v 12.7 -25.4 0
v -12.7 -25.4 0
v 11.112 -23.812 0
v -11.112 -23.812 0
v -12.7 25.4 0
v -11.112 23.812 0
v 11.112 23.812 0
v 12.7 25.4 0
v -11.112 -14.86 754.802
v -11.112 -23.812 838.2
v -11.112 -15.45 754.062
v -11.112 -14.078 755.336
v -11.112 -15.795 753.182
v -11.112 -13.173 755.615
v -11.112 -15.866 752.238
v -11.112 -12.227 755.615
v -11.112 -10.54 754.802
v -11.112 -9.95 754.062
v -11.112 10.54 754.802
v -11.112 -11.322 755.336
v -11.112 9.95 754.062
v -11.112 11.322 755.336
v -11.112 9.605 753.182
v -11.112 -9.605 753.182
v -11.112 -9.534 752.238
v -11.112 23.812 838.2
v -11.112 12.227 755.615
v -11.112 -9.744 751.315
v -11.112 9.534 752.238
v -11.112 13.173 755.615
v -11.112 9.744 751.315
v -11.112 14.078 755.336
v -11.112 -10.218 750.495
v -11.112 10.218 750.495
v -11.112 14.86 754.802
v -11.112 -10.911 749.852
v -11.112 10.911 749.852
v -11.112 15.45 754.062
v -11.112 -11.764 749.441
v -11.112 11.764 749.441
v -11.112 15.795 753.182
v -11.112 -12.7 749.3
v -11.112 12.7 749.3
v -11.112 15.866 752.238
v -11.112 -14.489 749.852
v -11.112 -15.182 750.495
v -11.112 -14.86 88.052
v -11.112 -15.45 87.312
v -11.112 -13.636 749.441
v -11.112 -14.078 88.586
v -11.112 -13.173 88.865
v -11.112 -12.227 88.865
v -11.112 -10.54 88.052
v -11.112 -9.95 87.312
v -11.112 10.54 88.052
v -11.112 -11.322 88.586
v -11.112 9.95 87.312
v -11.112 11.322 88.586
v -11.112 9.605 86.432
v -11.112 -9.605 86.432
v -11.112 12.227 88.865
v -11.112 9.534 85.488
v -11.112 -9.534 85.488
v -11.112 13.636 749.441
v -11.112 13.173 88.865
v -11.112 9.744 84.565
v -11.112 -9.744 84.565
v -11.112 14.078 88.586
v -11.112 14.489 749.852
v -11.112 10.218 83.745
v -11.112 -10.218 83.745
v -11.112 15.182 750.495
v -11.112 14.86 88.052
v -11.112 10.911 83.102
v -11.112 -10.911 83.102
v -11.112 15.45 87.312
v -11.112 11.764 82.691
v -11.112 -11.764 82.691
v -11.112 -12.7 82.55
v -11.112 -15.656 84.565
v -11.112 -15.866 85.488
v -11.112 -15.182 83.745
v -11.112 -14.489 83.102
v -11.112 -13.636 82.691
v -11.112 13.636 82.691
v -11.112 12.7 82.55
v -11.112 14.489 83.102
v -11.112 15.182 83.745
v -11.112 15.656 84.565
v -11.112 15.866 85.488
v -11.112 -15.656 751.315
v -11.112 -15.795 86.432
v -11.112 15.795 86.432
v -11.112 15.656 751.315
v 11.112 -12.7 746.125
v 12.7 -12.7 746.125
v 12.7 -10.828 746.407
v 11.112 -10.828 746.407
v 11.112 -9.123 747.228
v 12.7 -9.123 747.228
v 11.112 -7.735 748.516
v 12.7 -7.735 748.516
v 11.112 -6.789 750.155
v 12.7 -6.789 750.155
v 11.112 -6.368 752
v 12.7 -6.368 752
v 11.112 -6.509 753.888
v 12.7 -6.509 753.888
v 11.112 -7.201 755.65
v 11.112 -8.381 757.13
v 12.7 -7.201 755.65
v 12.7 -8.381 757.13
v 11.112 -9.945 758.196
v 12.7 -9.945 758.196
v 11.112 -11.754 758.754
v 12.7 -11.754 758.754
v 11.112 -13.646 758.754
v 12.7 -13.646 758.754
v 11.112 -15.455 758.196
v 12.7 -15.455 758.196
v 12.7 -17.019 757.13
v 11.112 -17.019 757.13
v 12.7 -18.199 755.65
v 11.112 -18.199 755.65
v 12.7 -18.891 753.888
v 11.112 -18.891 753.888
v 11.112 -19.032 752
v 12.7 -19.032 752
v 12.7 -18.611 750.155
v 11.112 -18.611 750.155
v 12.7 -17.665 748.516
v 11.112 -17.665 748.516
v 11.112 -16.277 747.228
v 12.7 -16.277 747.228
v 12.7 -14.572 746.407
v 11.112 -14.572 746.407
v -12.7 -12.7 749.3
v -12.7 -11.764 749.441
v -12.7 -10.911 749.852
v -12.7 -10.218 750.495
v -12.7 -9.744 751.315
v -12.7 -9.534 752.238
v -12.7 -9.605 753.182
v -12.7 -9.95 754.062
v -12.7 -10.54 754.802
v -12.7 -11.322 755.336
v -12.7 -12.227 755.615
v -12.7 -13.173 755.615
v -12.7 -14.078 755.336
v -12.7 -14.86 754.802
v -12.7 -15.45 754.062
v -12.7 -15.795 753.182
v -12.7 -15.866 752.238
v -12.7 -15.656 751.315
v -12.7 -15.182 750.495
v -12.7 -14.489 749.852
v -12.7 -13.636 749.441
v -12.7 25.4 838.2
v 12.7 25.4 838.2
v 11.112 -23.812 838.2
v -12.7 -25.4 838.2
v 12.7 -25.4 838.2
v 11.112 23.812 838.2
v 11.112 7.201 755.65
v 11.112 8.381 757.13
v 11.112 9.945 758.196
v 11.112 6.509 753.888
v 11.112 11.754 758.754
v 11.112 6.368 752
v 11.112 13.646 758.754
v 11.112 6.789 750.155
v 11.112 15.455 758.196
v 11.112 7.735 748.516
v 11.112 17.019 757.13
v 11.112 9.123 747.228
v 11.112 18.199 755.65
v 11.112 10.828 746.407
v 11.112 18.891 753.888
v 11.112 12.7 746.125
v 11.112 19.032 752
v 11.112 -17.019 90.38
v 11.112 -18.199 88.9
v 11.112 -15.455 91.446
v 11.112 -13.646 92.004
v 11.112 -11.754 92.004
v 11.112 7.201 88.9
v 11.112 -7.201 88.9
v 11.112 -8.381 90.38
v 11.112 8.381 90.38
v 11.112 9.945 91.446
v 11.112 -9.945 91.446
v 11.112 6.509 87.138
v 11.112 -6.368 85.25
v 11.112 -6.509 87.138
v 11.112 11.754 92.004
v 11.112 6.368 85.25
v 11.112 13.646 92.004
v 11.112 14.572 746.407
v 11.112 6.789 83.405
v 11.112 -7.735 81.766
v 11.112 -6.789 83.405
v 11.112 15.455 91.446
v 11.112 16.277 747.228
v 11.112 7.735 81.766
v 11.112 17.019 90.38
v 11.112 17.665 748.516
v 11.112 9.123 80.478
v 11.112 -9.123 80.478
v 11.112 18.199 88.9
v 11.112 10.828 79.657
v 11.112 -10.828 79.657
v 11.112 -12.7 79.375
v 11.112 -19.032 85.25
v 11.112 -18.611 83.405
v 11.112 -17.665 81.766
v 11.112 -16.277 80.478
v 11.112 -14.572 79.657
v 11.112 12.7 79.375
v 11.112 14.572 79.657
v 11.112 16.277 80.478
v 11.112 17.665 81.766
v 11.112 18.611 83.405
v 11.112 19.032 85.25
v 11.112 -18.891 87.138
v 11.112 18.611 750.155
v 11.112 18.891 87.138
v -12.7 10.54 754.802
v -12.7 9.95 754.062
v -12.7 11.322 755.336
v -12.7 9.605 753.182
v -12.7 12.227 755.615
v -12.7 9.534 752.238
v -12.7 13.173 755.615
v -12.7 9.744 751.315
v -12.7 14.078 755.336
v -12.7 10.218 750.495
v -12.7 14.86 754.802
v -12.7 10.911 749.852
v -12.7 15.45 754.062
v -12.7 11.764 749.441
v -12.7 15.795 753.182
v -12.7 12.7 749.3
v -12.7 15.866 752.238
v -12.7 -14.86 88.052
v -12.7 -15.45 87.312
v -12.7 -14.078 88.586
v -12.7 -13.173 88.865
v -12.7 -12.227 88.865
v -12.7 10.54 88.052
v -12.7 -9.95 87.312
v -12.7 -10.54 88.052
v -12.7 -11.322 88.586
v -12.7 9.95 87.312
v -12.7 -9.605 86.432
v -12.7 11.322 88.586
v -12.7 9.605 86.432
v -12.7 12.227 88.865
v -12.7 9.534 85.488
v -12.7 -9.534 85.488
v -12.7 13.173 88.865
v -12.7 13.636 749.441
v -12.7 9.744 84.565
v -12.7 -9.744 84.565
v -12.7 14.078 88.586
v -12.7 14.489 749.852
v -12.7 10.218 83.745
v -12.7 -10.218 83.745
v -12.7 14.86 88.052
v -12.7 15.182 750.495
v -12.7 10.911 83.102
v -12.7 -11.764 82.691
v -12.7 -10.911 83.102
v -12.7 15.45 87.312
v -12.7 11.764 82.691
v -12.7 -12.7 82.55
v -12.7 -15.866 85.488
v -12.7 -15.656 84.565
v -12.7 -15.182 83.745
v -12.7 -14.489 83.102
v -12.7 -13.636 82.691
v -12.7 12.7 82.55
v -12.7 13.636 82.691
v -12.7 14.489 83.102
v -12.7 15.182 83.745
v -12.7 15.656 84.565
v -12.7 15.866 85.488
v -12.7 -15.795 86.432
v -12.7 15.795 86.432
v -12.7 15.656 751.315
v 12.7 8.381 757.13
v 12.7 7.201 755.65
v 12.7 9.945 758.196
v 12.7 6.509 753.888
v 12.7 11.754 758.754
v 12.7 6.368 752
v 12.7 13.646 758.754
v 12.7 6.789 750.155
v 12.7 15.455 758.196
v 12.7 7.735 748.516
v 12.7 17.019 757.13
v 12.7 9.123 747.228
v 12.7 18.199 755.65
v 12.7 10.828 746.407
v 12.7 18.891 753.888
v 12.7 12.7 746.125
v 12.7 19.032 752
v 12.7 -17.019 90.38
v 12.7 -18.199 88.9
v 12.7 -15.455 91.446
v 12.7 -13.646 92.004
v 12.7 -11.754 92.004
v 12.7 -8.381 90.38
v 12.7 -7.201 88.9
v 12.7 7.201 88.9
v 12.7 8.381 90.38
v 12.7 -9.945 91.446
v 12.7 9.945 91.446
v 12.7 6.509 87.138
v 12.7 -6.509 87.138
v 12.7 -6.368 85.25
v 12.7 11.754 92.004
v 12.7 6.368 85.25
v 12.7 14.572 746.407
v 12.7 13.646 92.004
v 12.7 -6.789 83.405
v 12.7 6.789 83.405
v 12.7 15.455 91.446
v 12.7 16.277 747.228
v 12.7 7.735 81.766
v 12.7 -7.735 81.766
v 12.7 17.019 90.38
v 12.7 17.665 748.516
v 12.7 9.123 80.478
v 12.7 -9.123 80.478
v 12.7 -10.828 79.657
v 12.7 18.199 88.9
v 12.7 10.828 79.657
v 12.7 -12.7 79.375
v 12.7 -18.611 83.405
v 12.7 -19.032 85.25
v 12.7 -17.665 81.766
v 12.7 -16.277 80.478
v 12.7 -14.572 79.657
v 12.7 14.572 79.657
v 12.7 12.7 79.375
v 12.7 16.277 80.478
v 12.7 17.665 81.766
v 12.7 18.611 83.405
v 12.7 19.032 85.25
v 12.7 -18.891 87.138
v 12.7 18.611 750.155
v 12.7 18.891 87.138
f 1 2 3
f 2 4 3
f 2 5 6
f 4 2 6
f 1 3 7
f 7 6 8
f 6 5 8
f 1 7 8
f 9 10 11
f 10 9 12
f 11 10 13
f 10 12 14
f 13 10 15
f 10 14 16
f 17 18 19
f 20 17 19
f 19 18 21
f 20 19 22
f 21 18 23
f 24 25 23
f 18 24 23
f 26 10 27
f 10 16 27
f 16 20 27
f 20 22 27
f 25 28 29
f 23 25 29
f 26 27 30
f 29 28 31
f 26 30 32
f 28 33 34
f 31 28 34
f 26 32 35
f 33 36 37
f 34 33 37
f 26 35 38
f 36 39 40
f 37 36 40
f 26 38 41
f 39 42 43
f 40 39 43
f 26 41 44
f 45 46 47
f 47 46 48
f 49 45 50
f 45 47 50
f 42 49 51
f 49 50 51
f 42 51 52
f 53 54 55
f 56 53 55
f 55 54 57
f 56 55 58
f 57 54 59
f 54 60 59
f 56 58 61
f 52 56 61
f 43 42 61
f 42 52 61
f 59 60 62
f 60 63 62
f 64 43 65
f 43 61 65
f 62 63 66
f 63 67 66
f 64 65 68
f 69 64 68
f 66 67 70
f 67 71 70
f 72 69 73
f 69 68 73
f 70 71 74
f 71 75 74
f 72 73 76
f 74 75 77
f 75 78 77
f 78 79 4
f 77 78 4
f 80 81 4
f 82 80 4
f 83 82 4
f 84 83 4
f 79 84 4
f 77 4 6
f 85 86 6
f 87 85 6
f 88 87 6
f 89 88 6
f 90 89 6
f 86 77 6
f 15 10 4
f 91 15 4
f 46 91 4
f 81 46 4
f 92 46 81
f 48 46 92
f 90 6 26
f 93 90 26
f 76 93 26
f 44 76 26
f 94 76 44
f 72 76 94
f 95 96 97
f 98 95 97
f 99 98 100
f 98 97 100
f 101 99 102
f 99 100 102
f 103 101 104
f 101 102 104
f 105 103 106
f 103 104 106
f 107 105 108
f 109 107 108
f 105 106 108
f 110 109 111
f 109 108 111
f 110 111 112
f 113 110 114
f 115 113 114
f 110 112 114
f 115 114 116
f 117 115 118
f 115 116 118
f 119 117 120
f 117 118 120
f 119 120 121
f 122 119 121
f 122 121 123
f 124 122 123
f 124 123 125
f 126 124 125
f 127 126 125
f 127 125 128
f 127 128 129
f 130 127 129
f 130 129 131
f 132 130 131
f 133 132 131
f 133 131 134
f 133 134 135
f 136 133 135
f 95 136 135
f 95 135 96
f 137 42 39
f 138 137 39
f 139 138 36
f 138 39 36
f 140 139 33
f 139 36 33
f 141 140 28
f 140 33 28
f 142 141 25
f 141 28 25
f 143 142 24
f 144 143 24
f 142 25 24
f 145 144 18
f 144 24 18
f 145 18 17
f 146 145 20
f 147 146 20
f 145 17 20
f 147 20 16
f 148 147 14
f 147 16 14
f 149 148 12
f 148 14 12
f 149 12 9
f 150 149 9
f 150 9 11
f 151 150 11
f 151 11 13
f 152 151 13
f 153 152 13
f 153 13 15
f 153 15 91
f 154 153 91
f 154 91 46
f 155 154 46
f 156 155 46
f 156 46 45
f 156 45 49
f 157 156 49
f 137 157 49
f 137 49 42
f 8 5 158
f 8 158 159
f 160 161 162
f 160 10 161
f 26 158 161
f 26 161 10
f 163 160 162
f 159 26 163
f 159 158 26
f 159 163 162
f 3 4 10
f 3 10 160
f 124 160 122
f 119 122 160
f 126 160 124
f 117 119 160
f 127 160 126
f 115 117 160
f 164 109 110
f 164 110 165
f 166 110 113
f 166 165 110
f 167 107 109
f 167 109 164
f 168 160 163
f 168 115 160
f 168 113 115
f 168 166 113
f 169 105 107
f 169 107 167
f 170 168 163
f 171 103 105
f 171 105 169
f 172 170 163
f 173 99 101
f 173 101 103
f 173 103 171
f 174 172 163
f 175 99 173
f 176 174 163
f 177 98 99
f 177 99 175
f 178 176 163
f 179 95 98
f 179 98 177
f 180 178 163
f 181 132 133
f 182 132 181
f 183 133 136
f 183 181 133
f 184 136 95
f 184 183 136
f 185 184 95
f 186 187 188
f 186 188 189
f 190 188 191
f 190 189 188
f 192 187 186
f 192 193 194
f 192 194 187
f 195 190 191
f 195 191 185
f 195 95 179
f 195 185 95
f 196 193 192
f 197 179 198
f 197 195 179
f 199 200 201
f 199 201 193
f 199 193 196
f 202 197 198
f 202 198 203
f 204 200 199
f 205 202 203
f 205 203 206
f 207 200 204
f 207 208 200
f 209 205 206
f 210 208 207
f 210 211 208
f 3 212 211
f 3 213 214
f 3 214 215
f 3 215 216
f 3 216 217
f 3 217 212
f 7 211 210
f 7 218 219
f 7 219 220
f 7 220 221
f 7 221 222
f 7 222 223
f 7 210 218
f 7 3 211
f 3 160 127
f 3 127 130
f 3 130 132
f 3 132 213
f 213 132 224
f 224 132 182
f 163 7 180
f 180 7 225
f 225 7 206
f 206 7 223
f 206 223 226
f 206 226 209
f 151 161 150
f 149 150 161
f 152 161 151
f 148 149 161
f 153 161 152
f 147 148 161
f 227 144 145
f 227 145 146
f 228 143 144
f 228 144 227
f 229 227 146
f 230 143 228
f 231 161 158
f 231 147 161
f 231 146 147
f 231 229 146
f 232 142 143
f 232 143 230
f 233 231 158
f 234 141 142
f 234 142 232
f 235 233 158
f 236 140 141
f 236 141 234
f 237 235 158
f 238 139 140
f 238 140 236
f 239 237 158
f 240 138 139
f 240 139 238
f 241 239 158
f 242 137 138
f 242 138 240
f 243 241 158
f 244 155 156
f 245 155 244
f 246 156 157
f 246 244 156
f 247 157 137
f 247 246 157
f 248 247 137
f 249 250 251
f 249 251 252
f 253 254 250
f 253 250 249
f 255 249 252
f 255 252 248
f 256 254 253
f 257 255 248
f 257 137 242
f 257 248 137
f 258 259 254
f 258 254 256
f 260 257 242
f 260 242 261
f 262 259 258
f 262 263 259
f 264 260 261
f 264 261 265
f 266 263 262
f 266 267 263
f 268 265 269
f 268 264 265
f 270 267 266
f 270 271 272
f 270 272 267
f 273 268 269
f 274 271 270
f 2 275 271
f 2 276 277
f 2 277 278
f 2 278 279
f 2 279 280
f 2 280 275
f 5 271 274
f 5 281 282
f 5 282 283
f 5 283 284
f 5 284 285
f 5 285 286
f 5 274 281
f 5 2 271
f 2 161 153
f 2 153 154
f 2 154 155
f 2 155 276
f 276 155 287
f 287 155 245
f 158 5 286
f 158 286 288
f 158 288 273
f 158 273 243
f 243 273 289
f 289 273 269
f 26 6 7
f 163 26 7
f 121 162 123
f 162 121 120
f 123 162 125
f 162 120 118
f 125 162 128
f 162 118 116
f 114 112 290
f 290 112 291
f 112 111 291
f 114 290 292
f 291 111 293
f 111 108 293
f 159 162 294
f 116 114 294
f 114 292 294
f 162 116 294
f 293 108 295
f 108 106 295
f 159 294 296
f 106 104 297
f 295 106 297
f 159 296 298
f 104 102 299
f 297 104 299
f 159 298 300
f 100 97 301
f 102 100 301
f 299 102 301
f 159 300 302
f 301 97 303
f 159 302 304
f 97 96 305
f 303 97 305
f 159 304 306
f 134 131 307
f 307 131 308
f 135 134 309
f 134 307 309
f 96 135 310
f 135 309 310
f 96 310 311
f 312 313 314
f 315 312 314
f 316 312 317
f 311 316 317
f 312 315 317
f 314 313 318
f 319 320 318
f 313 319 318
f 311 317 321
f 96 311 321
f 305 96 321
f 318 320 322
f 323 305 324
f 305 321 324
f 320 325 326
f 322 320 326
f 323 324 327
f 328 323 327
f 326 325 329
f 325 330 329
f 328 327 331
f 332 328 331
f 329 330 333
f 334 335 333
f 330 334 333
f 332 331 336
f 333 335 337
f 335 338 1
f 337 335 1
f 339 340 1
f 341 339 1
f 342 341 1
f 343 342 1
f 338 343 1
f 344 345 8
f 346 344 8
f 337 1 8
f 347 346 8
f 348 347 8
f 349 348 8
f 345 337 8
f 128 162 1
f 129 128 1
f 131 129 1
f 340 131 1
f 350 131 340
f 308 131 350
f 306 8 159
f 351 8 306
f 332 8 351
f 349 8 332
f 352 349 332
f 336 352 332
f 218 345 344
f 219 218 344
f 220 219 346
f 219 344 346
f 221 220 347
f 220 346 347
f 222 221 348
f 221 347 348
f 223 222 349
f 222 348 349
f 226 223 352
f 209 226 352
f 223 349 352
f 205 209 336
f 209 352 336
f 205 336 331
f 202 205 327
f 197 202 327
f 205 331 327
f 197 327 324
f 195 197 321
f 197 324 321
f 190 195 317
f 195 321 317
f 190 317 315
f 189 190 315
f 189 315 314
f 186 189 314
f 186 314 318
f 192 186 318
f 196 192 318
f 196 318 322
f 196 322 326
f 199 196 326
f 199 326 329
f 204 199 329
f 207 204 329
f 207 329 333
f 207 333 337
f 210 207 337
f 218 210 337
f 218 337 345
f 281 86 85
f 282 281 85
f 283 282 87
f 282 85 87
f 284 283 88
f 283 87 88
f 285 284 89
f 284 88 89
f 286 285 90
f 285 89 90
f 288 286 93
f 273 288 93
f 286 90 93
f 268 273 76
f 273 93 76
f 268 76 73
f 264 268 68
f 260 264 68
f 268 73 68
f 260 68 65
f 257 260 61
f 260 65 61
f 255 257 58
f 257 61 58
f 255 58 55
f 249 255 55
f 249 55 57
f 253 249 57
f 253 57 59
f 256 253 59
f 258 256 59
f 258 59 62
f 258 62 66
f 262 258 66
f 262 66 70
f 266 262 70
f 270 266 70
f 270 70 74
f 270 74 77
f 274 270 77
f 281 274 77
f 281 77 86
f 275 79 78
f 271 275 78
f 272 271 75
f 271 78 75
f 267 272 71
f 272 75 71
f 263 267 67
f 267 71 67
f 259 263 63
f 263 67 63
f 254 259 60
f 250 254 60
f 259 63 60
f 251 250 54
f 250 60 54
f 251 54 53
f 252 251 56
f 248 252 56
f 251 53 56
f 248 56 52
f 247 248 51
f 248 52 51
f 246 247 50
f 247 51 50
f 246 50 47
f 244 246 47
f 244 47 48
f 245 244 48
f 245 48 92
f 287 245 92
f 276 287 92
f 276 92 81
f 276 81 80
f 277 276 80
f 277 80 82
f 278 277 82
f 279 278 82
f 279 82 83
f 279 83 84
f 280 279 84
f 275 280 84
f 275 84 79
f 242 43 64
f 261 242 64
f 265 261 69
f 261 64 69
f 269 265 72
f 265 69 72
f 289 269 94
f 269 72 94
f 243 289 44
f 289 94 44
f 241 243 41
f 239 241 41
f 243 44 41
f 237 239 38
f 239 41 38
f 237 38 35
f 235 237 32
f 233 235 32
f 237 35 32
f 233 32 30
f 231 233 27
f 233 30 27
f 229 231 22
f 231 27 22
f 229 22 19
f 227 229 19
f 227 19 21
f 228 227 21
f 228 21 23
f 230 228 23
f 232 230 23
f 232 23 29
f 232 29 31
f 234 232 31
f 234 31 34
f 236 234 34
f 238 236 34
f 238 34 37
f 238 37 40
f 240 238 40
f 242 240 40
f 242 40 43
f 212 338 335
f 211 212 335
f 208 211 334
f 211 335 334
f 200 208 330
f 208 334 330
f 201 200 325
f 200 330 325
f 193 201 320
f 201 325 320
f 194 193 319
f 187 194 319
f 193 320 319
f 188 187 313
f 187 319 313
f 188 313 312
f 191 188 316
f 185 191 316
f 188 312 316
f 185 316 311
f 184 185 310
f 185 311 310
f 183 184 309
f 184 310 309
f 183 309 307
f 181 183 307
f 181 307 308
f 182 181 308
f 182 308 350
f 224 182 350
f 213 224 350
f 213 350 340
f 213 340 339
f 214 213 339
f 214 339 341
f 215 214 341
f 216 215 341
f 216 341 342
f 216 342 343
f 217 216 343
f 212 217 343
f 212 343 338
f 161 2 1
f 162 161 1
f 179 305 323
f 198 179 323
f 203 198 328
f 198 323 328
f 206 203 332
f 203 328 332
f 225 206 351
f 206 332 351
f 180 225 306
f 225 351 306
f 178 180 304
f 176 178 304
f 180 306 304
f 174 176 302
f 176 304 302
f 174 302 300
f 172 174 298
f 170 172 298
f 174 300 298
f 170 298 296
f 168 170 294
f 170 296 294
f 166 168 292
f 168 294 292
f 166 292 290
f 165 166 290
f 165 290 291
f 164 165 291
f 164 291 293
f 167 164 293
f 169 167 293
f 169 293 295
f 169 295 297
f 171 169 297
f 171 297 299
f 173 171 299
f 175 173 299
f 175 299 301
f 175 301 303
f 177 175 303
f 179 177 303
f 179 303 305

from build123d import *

# Parameters (mm, degrees)
SKETCH1_W           = 25.4
SKETCH1_H           = 50.8
SKETCH1_W_2         = 22.225
SKETCH1_H_2         = 47.625
BOSS_EXTRUDE1_DEPTH = 838.2
SKETCH2_R           = 3.175
CUT_EXTRUDE1_DEPTH  = 839.969343898
CUT_EXTRUDE2_REACH  = 840.969
SKETCH3_R           = 6.35


with BuildPart() as part:
    # Sketch1 → Boss-Extrude1 (new body)
    with BuildSketch(Plane.XY):
        Rectangle(SKETCH1_W, SKETCH1_H)
        Rectangle(SKETCH1_W_2, SKETCH1_H_2, mode=Mode.SUBTRACT)
    extrude(amount=BOSS_EXTRUDE1_DEPTH)

    # Sketch2 → Cut-Extrude1 (cut, through all)
    with BuildSketch(Plane(origin=(12.7, 0, 0), x_dir=(0, 0, -1), z_dir=(1, 0, 0))):
        with Locations((-85.725, 12.7)):
            Circle(SKETCH2_R)
        with Locations((-85.725, -12.7)):
            Circle(SKETCH2_R)
        with Locations((-752.475, 12.7)):
            Circle(SKETCH2_R)
        with Locations((-752.475, -12.7)):
            Circle(SKETCH2_R)
    extrude(amount=-CUT_EXTRUDE1_DEPTH, mode=Mode.SUBTRACT)

    # Sketch3 → Cut-Extrude2 (cut, up to next)
    with BuildSketch(Plane(origin=(12.7, 0, 0), x_dir=(0, 0, -1), z_dir=(1, 0, 0)), mode=Mode.PRIVATE) as cut_extrude2_sk1:
        with Locations((-752.475, 12.7)):
            Circle(SKETCH3_R)
    cut_extrude2_tool1 = extrude(cut_extrude2_sk1.sketch, amount=-CUT_EXTRUDE2_REACH, mode=Mode.PRIVATE) & part.part
    # Sketch3 → Cut-Extrude2 (cut, up to next)
    with BuildSketch(Plane(origin=(12.7, 0, 0), x_dir=(0, 0, -1), z_dir=(1, 0, 0)), mode=Mode.PRIVATE) as cut_extrude2_sk2:
        with Locations((-752.475, -12.7)):
            Circle(SKETCH3_R)
    cut_extrude2_tool2 = extrude(cut_extrude2_sk2.sketch, amount=-CUT_EXTRUDE2_REACH, mode=Mode.PRIVATE) & part.part
    # Sketch3 → Cut-Extrude2 (cut, up to next)
    with BuildSketch(Plane(origin=(12.7, 0, 0), x_dir=(0, 0, -1), z_dir=(1, 0, 0)), mode=Mode.PRIVATE) as cut_extrude2_sk3:
        with Locations((-85.725, 12.7)):
            Circle(SKETCH3_R)
    cut_extrude2_tool3 = extrude(cut_extrude2_sk3.sketch, amount=-CUT_EXTRUDE2_REACH, mode=Mode.PRIVATE) & part.part
    # Sketch3 → Cut-Extrude2 (cut, up to next)
    with BuildSketch(Plane(origin=(12.7, 0, 0), x_dir=(0, 0, -1), z_dir=(1, 0, 0)), mode=Mode.PRIVATE) as cut_extrude2_sk4:
        with Locations((-85.725, -12.7)):
            Circle(SKETCH3_R)
    cut_extrude2_tool4 = extrude(cut_extrude2_sk4.sketch, amount=-CUT_EXTRUDE2_REACH, mode=Mode.PRIVATE) & part.part
    add(cut_extrude2_tool1.solids().sort_by_distance((12.7, 12.7, 752.475))[0], mode=Mode.SUBTRACT)
    add(cut_extrude2_tool2.solids().sort_by_distance((12.7, -12.7, 752.475))[0], mode=Mode.SUBTRACT)
    add(cut_extrude2_tool3.solids().sort_by_distance((12.7, 12.7, 85.725))[0], mode=Mode.SUBTRACT)
    add(cut_extrude2_tool4.solids().sort_by_distance((12.7, -12.7, 85.725))[0], mode=Mode.SUBTRACT)


solid = part.part
